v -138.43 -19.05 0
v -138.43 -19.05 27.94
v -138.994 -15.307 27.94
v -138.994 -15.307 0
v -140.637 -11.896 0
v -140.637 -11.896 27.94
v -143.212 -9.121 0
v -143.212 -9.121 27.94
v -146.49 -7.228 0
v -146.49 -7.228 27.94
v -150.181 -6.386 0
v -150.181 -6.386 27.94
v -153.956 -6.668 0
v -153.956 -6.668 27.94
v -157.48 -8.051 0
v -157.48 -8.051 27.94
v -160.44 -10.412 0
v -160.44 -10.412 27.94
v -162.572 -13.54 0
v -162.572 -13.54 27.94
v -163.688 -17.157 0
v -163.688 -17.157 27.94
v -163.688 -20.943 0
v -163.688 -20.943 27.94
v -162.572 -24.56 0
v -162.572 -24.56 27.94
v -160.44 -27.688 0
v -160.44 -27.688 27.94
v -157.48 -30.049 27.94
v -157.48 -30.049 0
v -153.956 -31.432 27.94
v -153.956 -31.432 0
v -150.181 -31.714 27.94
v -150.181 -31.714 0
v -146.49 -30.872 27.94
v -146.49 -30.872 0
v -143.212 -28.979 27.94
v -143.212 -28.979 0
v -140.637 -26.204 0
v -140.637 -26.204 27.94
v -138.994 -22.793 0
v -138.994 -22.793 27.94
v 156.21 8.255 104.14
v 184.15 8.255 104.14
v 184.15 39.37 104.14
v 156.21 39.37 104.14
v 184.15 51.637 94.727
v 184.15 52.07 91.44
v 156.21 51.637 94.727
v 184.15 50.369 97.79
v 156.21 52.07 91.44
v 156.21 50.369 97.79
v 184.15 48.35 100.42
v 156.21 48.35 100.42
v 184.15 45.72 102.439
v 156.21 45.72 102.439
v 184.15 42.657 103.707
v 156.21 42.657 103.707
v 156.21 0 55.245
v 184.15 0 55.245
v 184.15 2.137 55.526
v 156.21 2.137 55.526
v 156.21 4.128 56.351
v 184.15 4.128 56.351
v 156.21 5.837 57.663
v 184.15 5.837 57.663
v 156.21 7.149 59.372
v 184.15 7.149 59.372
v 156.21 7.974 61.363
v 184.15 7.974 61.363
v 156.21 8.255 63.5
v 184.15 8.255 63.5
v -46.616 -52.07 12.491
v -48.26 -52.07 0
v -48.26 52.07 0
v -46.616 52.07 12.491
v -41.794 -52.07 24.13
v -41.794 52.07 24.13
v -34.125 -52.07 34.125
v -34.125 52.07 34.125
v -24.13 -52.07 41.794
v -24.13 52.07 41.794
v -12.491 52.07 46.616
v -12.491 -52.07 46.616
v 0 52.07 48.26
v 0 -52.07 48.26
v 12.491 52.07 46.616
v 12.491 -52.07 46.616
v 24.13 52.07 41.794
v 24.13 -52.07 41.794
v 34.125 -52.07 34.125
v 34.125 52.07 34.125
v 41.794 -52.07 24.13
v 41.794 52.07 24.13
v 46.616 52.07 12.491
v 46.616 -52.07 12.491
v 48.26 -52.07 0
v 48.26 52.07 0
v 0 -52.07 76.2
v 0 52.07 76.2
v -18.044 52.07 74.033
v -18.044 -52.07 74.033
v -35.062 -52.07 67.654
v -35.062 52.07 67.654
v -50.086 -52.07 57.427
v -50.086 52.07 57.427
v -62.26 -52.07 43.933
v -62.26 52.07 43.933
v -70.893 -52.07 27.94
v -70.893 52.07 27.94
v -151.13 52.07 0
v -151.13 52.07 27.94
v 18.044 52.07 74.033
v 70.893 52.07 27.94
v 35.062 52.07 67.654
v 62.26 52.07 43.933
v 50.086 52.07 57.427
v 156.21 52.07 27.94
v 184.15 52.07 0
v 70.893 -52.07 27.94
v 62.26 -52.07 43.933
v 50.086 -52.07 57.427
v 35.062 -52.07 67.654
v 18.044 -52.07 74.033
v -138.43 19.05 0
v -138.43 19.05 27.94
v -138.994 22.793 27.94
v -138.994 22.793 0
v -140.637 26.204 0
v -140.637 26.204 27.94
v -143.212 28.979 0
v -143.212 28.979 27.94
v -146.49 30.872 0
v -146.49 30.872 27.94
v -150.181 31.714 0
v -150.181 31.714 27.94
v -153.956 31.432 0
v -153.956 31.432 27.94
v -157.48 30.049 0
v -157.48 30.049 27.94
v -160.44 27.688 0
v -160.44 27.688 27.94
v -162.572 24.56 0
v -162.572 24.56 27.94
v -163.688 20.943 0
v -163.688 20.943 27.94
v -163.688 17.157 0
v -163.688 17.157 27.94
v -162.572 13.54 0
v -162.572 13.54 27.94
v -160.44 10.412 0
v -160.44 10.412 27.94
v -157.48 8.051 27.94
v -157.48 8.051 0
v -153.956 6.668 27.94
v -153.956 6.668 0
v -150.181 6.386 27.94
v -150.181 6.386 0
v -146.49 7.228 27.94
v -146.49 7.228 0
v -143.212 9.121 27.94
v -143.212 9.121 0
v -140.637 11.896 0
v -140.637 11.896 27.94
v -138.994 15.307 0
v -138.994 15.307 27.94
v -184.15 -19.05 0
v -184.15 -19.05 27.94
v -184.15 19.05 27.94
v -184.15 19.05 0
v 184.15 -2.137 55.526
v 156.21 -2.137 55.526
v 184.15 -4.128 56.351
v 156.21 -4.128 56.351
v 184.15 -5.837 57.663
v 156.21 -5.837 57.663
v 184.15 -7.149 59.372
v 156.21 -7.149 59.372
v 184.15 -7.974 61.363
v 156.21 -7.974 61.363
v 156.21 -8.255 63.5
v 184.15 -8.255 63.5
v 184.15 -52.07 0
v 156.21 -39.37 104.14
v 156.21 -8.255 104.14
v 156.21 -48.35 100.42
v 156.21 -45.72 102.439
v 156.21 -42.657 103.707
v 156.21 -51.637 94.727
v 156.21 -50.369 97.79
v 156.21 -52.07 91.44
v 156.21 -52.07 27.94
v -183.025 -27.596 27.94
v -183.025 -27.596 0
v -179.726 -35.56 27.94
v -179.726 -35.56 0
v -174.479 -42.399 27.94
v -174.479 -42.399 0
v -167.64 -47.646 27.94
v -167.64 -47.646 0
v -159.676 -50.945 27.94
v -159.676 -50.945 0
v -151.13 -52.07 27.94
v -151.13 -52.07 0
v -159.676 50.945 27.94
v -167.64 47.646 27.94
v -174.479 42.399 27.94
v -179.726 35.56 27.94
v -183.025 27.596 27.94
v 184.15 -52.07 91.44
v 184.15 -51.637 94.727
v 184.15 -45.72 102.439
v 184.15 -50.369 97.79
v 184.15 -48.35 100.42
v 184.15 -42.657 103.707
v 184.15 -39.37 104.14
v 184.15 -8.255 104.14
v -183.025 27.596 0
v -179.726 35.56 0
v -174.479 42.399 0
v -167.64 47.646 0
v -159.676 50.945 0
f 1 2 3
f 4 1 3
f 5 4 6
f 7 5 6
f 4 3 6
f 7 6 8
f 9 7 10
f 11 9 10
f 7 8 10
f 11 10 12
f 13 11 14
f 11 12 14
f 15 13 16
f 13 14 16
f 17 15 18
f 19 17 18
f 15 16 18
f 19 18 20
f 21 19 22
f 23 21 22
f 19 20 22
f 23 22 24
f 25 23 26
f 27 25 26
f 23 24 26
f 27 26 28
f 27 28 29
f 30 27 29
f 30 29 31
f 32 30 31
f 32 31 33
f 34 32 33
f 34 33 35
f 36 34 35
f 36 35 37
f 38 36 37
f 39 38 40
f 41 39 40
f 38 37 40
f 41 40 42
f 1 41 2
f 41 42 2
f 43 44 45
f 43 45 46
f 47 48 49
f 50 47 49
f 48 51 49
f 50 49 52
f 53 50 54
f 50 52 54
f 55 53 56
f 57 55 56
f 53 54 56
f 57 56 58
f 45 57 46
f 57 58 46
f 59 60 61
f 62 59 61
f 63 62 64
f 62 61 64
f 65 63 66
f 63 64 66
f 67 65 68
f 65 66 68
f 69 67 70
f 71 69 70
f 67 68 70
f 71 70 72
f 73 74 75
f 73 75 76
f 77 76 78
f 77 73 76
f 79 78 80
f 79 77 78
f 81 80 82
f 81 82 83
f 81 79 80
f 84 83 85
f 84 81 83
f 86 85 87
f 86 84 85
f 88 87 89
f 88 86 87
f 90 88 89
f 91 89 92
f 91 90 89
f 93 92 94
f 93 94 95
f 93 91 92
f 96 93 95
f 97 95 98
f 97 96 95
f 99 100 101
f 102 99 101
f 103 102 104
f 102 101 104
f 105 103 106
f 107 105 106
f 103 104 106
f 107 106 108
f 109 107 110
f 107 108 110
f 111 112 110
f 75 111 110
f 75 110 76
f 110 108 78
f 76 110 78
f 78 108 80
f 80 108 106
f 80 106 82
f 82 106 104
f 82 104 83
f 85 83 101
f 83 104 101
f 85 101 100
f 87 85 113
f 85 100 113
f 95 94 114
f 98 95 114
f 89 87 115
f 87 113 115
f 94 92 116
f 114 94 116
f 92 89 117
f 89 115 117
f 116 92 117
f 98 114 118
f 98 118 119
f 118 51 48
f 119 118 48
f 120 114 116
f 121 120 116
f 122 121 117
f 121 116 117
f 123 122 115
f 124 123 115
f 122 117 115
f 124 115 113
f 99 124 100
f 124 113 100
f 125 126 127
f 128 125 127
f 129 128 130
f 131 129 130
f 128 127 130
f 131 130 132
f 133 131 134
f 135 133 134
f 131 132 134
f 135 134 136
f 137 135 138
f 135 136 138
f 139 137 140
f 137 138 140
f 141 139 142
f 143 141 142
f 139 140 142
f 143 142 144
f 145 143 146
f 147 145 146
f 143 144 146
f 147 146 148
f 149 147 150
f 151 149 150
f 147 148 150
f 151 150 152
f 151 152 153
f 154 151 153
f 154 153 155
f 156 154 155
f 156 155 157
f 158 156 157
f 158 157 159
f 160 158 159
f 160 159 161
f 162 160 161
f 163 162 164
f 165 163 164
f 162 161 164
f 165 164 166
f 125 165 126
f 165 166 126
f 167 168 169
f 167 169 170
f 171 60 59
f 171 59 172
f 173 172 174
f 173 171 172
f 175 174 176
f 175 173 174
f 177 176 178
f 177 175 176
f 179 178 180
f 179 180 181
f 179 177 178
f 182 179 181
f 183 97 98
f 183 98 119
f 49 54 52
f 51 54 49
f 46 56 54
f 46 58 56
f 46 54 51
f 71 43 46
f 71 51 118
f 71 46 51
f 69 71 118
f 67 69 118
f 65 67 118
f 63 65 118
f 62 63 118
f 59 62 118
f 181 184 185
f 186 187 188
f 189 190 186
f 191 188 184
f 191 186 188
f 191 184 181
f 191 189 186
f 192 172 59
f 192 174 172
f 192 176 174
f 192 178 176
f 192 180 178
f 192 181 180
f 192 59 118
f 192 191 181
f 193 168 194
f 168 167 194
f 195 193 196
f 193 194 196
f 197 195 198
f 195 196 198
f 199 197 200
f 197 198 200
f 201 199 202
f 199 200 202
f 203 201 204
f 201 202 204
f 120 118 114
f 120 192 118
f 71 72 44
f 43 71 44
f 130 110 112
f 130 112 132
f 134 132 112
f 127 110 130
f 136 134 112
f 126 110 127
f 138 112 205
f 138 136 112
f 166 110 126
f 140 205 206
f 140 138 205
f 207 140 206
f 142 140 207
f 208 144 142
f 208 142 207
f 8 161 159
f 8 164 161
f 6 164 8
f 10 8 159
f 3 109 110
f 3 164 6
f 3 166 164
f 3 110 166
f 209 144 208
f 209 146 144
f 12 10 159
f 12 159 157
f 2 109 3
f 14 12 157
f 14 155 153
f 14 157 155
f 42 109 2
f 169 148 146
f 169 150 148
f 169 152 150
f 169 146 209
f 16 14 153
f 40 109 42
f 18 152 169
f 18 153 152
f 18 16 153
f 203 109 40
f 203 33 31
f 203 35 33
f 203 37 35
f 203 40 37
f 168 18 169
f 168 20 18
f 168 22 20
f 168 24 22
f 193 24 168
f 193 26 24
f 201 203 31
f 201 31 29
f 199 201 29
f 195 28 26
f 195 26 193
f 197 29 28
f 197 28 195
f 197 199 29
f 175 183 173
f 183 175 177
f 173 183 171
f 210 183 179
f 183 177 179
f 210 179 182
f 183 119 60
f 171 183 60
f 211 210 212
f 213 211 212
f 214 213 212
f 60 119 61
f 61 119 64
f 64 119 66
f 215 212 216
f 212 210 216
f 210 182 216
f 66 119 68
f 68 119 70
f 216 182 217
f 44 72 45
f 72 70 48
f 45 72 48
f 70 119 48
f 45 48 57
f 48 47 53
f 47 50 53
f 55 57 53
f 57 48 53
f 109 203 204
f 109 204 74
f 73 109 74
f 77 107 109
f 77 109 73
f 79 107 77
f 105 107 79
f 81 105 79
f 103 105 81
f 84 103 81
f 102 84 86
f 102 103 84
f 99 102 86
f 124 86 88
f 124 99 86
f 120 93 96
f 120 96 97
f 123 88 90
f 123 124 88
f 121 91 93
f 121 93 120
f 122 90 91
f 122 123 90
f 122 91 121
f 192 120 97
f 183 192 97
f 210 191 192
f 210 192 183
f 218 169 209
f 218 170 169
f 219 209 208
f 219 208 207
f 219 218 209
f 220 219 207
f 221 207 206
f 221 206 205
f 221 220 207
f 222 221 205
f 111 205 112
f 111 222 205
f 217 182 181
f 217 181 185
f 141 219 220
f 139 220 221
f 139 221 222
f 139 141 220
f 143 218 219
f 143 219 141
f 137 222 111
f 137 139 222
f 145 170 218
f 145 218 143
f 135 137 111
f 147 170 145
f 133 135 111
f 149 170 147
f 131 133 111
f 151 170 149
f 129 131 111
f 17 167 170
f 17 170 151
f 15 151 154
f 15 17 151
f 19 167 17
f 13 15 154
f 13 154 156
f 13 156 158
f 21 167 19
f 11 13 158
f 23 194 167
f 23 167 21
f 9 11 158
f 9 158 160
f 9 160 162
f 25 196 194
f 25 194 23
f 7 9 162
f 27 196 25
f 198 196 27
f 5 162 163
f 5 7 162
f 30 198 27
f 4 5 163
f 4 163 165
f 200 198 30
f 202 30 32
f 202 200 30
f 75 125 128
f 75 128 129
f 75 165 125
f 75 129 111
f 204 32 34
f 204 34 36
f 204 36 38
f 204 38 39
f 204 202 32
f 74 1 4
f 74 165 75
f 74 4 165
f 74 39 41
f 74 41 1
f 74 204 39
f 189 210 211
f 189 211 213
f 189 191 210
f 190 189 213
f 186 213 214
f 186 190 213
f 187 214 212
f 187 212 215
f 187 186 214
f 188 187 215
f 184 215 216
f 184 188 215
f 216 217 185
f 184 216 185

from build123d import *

# Parameters (mm, degrees)
F1_DEPTH = 52.07
F2_R     = 33.02
F3_R     = 12.7
F4_DEPTH = 27.94
F6_DEPTH = 27.94
F7_R     = 12.7


# Not quite as in the source:
# - a pattern or mirror of a feature is missing from the dataset's text; its kind, count and spacing are read off the source's solid


with BuildPart() as f1:
    # F0 (on Front) → F1 (new body, symmetric)
    with BuildSketch(Plane.XZ):
        with BuildLine():
            Line((-184.15, 27.94), (-184.15, 0))
            Line((-184.15, 0), (-48.26, 0))
            ThreePointArc((-48.26, 0), (-34.1249732601, 34.1249732601), (0, 48.26))
            ThreePointArc((0, 48.26), (34.1249732601, 34.1249732601), (48.26, 0))
            Line((48.26, 0), (184.15, 0))
            Line((184.15, 0), (184.15, 104.14))
            Line((184.15, 104.14), (156.21, 104.14))
            Line((156.21, 104.14), (156.21, 27.94))
            Line((156.21, 27.94), (70.8928515437, 27.94))
            ThreePointArc((70.8928515437, 27.94), (42.880135261, 62.9899515796), (0, 76.2))
            ThreePointArc((0, 76.2), (-42.880135261, 62.9899515796), (-70.8928515437, 27.94))
            Line((-70.8928515437, 27.94), (-184.15, 27.94))
        make_face()
    extrude(amount=F1_DEPTH, both=True)

    # F2
    f2_edges = [f1.edges().sort_by_distance(p)[0] for p in [
        (-184.15, 52.07, 13.97),
        (-184.15, -52.07, 13.97),
    ]]
    fillet(f2_edges, radius=F2_R)

    # F3 (on face) → F4 (cut)
    with BuildSketch(Plane.XY.offset(27.94)):
        with Locations((-151.13, 19.05)):
            Circle(F3_R)
        with Locations((-151.13, -19.05)):
            Circle(F3_R)
    extrude(amount=-F4_DEPTH, mode=Mode.SUBTRACT)

    # F5 (on face) → F6 (cut)
    with BuildSketch(Plane.YZ.offset(184.15)):
        with BuildLine():
            Line((0, 104.14), (0, 55.245))
            ThreePointArc((0, 55.245), (5.8371664787, 57.6628335213), (8.255, 63.5))
            Line((8.255, 63.5), (8.255, 104.14))
            Line((8.255, 104.14), (0, 104.14))
        make_face()
    f6 = extrude(amount=-F6_DEPTH, mode=Mode.SUBTRACT)

    # F6_copies: F6 across plane
    add(f6.mirror(Plane(origin=(0, 0, 0), x_dir=(0, 0, -1), z_dir=(0, -1, 0))), mode=Mode.SUBTRACT)

    # F7
    f7_edges = [f1.edges().sort_by_distance(p)[0] for p in [
        (170.18, -52.07, 104.14),
        (170.18, 52.07, 104.14),
    ]]
    fillet(f7_edges, radius=F7_R)


solid = f1.part
